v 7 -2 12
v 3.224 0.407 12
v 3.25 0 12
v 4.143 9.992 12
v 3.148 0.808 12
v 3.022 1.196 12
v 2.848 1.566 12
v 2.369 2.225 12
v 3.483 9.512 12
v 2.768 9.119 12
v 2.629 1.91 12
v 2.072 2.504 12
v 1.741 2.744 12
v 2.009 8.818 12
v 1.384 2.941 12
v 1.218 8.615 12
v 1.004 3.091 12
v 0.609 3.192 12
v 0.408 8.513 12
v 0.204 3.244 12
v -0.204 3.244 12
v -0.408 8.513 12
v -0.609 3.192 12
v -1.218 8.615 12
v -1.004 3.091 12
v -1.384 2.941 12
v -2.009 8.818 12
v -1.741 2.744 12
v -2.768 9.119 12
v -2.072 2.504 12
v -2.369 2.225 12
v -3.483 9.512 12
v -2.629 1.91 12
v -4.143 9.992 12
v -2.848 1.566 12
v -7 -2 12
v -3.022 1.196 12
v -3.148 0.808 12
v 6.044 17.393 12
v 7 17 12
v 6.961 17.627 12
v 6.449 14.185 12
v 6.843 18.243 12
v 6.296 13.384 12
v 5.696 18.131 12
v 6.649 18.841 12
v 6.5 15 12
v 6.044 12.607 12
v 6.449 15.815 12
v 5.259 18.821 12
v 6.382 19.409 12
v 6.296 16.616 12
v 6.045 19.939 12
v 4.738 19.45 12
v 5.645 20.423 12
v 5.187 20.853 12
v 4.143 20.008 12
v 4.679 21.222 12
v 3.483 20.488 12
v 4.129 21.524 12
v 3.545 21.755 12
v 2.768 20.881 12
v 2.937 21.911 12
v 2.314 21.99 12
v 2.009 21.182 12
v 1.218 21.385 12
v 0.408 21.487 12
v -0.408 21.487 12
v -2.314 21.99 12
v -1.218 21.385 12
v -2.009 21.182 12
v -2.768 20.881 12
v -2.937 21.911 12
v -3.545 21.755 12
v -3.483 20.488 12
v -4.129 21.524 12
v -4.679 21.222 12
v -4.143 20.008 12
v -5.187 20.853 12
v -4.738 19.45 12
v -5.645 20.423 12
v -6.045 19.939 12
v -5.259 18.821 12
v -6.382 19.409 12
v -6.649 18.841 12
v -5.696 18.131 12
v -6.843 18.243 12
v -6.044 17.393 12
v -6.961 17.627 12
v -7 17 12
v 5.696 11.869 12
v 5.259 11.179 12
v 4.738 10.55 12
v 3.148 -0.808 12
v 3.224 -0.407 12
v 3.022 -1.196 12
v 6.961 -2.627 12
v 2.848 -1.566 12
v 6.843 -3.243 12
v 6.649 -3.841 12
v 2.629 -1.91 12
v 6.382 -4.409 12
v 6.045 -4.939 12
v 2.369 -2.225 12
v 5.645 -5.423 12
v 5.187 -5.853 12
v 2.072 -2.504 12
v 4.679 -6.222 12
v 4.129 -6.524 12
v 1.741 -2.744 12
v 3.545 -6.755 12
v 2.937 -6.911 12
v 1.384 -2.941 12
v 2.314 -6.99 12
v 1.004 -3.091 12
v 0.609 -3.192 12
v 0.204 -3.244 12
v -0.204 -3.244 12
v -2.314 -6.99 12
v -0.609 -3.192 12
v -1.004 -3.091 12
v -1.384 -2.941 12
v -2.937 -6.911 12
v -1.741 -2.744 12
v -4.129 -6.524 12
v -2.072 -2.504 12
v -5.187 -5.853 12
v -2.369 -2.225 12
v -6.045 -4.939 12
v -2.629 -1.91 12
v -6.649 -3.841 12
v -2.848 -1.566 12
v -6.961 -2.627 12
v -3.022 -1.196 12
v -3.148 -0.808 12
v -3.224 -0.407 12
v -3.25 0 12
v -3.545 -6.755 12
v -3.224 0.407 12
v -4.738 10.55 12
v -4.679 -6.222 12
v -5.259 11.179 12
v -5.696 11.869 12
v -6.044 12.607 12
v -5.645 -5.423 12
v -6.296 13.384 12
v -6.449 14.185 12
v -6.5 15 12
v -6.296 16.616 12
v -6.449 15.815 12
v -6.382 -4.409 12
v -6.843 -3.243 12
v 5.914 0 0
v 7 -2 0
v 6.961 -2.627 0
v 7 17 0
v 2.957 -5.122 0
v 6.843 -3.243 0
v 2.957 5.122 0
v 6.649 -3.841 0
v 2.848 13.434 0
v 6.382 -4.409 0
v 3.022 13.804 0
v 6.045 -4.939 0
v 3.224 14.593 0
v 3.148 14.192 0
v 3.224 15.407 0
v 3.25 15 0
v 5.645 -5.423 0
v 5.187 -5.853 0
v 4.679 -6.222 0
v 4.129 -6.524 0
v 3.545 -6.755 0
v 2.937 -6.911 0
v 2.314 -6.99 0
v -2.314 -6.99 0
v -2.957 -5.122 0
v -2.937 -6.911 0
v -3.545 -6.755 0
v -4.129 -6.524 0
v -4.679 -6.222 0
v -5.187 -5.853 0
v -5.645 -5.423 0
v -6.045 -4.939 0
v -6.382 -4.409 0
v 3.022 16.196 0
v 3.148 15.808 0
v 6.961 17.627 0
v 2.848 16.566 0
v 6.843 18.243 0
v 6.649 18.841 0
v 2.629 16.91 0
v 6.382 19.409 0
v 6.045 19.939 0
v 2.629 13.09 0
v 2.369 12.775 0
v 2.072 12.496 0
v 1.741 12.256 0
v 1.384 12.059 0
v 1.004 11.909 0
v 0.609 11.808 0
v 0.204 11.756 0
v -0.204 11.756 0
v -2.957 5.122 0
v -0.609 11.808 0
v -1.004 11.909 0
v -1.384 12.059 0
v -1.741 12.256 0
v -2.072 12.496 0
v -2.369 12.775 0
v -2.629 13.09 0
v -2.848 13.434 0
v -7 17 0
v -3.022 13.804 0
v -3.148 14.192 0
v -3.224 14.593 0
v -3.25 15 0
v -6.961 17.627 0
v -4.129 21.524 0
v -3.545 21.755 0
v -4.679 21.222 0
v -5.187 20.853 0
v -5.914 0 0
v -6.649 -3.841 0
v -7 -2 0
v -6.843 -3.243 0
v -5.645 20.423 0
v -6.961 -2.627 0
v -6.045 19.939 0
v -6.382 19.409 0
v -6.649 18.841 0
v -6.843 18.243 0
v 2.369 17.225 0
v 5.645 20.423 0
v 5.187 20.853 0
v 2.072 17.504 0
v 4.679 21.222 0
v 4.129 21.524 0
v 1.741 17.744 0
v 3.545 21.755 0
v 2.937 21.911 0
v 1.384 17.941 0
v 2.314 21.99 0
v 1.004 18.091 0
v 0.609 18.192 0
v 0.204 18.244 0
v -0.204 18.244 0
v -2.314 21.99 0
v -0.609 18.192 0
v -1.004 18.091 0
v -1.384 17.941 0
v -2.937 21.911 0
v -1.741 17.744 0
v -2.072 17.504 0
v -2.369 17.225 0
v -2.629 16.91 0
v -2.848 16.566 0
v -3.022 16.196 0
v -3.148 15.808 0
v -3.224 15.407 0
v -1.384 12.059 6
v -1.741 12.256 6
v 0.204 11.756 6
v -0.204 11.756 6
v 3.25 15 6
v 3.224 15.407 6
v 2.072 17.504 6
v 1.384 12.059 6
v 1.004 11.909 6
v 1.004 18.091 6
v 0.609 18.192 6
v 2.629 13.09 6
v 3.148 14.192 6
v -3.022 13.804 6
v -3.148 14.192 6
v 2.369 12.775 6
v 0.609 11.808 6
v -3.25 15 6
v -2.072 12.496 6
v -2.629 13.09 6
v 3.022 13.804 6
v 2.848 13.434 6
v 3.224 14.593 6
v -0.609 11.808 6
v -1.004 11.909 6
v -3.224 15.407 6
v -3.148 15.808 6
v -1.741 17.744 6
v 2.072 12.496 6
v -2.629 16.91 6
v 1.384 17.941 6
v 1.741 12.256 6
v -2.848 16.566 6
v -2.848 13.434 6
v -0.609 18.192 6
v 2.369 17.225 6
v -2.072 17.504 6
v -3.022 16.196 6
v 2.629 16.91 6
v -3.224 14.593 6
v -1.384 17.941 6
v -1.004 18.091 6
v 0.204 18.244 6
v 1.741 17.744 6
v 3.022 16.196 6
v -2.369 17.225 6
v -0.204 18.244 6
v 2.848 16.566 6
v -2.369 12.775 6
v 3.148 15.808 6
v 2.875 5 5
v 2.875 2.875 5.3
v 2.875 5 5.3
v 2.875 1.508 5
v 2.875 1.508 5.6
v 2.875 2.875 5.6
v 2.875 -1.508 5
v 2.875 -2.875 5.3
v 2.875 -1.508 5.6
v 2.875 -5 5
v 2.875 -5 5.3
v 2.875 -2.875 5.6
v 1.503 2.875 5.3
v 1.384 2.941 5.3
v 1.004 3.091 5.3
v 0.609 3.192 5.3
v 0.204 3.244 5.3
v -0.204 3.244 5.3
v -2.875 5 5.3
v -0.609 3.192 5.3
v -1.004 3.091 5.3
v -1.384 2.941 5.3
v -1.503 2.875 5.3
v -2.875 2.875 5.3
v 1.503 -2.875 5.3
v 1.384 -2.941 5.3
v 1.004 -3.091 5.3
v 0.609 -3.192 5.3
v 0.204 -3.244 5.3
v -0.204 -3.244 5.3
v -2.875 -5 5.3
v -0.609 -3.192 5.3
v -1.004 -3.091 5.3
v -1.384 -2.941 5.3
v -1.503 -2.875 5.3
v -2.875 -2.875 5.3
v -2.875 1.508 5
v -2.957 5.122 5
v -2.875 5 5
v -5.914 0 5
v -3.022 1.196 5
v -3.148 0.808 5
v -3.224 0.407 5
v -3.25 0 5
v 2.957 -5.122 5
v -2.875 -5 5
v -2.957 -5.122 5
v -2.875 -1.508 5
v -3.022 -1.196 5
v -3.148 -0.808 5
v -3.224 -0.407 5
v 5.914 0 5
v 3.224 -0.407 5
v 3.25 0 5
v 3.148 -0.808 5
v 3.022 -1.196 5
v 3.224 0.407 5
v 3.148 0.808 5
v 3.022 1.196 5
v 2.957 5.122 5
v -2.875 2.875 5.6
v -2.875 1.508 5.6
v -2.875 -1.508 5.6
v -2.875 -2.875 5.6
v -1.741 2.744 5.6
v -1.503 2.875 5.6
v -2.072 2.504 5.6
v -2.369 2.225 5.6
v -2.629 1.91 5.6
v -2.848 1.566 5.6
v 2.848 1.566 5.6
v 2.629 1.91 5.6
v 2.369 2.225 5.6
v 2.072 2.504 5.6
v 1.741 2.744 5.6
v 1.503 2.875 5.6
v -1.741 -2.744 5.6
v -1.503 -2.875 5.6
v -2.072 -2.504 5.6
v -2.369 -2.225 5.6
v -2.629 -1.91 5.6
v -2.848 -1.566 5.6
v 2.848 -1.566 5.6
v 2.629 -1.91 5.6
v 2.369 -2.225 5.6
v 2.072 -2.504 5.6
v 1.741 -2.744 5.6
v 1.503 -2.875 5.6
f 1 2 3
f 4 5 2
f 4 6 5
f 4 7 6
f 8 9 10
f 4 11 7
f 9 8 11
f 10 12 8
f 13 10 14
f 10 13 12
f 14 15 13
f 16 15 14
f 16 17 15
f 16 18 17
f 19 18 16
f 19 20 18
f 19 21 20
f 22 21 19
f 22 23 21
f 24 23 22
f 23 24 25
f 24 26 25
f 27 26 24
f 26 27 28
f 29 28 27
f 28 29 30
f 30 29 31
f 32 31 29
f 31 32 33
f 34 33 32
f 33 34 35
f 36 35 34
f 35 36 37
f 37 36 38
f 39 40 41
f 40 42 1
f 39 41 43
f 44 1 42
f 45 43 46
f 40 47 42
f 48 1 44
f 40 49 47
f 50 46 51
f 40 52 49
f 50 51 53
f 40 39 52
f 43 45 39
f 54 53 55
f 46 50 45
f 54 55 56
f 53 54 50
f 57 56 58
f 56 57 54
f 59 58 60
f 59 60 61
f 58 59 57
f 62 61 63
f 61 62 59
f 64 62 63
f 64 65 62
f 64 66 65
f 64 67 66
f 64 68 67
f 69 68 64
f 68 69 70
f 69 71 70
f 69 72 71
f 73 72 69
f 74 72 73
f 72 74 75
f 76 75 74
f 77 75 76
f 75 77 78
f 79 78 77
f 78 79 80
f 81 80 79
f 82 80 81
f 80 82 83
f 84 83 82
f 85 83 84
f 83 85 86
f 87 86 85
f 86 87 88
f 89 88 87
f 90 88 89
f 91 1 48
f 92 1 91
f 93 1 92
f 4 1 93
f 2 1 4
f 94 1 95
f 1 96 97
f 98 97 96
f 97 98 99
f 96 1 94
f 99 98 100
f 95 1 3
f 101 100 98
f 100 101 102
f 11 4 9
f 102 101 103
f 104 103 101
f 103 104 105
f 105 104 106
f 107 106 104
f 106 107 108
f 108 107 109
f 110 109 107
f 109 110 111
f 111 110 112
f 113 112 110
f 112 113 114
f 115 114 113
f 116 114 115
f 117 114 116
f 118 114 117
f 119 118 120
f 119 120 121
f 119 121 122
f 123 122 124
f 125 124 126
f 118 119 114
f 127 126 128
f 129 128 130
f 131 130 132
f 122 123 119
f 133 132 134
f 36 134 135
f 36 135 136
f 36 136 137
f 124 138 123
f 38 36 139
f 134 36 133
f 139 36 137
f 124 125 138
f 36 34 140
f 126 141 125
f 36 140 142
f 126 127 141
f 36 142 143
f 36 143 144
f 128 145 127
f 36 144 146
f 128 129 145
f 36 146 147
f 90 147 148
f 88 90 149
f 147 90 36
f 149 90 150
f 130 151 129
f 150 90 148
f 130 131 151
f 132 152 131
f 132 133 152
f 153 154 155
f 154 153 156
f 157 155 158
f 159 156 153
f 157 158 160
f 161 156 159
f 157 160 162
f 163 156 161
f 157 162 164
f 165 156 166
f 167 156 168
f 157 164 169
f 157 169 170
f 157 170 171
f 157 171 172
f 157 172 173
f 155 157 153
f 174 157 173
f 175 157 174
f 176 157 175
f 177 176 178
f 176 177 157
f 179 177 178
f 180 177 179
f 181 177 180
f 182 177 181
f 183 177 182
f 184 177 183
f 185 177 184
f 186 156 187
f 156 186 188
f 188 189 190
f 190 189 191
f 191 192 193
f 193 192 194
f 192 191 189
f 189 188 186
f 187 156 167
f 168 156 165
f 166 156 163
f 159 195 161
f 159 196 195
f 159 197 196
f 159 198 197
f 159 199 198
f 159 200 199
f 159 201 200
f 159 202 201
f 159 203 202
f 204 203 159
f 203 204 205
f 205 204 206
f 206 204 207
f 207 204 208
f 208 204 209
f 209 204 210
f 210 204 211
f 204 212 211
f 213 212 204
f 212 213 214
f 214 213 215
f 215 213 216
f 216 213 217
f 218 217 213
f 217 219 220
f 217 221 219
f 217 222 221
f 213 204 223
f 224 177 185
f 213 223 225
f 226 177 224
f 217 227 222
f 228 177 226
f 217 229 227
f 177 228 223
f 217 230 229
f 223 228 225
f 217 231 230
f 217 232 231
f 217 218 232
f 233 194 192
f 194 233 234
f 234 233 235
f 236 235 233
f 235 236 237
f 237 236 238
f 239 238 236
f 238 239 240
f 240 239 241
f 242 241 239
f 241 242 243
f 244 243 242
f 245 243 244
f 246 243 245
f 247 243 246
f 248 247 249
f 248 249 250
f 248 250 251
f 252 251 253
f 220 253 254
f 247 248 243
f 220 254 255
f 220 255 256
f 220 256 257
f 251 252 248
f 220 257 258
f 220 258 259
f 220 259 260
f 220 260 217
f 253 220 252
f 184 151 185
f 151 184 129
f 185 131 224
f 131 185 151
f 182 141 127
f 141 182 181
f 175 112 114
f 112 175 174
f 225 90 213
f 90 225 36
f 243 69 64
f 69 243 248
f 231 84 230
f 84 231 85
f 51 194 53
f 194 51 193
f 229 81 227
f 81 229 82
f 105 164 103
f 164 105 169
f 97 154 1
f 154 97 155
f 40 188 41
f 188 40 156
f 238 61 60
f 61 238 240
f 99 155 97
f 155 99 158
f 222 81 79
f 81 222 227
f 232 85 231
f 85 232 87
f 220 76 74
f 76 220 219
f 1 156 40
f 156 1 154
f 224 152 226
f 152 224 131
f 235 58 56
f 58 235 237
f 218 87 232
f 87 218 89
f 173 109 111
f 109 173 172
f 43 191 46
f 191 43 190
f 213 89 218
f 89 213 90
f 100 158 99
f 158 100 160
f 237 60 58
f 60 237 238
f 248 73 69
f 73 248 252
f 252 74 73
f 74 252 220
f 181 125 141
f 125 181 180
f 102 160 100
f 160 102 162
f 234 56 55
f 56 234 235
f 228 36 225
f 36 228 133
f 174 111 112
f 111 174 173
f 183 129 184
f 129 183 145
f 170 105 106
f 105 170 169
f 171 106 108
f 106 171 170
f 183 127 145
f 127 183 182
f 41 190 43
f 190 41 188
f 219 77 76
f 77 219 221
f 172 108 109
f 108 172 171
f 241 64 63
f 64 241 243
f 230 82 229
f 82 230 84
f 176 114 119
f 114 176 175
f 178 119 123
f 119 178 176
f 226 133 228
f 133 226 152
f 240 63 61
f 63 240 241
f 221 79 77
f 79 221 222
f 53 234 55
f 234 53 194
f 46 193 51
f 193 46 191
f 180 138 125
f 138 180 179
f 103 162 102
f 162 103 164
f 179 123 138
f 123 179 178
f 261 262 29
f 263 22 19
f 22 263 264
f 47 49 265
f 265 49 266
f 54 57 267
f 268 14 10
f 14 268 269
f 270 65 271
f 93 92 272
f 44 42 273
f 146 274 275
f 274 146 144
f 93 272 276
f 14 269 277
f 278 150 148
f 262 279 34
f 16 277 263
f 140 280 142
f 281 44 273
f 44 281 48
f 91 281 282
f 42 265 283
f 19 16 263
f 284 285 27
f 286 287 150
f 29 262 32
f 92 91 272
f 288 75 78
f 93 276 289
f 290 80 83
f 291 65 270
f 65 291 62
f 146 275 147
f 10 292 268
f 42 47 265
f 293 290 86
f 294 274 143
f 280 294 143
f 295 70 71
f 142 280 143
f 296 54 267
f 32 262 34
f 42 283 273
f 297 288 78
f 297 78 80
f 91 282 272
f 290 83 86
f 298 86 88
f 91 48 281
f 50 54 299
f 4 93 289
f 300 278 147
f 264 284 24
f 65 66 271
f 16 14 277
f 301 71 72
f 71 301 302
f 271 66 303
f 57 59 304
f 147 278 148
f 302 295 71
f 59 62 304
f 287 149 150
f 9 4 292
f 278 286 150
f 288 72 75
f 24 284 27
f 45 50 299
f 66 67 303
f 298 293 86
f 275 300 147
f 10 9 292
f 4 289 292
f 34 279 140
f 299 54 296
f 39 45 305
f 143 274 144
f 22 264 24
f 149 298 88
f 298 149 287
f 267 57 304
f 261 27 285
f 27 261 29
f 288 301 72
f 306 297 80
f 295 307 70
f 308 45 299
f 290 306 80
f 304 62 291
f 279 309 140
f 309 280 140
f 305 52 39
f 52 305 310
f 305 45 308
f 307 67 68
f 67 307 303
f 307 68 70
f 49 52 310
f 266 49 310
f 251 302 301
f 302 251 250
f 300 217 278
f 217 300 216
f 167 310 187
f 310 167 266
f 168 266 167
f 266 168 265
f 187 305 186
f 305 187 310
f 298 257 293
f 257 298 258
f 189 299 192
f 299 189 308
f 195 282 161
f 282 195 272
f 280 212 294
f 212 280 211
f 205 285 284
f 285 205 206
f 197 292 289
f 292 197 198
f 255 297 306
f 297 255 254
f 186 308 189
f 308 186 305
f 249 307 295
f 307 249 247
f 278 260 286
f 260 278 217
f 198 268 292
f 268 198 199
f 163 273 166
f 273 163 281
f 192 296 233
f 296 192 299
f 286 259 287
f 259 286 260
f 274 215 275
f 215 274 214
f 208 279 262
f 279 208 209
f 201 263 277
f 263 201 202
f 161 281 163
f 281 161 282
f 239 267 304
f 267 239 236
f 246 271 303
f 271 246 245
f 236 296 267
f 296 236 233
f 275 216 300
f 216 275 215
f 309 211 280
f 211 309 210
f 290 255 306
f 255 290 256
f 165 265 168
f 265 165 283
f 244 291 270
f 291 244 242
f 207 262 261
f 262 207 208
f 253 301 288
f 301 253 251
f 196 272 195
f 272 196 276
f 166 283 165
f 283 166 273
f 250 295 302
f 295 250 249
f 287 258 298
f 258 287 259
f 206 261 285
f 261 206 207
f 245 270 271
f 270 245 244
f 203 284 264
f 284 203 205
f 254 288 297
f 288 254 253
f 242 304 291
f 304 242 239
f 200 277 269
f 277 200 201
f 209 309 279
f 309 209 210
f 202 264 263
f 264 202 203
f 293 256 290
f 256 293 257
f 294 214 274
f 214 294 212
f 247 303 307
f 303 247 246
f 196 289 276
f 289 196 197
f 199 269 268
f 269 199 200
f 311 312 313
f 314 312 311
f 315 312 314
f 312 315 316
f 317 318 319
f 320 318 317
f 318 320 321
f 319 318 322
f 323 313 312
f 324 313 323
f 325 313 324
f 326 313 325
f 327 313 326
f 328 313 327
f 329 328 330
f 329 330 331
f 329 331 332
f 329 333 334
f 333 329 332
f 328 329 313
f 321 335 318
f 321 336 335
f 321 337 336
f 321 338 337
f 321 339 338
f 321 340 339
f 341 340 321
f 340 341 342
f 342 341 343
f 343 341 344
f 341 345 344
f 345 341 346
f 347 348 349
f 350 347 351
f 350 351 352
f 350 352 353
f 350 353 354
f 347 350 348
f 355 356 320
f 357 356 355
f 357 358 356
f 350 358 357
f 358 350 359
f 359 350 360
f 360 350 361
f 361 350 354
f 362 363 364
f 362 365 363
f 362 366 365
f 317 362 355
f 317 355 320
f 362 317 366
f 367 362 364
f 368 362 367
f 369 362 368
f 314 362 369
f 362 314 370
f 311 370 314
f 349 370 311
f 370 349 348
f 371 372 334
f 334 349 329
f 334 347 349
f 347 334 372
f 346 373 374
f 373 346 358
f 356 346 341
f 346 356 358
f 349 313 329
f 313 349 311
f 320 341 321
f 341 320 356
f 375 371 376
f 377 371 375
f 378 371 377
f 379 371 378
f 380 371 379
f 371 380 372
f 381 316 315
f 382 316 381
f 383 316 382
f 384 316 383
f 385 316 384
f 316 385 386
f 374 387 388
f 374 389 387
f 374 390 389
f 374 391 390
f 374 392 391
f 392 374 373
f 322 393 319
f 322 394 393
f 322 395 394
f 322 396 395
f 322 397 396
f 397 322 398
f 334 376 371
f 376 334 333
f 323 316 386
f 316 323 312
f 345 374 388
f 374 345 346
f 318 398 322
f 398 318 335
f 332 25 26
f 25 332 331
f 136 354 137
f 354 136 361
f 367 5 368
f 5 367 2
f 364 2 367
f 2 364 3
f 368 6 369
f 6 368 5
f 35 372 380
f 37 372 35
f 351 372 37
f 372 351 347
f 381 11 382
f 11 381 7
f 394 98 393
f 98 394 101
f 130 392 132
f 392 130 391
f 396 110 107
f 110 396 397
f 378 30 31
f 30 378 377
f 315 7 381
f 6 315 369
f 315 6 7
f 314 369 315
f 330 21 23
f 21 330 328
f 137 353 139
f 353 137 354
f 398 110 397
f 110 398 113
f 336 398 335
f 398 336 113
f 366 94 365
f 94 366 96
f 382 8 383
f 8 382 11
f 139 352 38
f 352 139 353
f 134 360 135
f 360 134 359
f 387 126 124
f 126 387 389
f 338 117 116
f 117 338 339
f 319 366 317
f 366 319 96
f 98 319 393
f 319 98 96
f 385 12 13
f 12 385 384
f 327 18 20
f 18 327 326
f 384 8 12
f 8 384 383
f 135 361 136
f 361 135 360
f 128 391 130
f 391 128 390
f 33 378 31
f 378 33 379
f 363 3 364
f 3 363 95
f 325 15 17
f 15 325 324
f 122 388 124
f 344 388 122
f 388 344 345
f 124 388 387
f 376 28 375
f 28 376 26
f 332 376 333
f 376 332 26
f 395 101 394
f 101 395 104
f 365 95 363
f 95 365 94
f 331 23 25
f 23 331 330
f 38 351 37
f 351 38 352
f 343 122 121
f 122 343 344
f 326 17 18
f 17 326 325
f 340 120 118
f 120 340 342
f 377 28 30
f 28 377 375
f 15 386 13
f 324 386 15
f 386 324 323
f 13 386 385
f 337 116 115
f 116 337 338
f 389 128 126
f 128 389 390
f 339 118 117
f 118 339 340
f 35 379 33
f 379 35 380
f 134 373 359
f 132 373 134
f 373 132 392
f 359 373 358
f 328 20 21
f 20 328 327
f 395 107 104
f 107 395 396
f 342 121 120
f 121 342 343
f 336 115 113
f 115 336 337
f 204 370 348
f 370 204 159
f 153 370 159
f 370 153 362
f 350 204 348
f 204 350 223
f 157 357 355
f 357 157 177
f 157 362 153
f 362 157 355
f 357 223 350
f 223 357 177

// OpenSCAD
$fn = 50;


difference() {
	union() {
		cylinder(h = 12, r = 7.0000000000);
		translate(v = [0.0000000000, 7.5000000000, 0]) {
			hull() {
				translate(v = [-2.0000000000, 9.5000000000, 0]) {
					cylinder(h = 12, r = 5);
				}
				translate(v = [2.0000000000, 9.5000000000, 0]) {
					cylinder(h = 12, r = 5);
				}
				translate(v = [-2.0000000000, -9.5000000000, 0]) {
					cylinder(h = 12, r = 5);
				}
				translate(v = [2.0000000000, -9.5000000000, 0]) {
					cylinder(h = 12, r = 5);
				}
			}
		}
		translate(v = [0.0000000000, 7.5000000000, 0]) {
			hull() {
				translate(v = [-2.0000000000, 9.5000000000, 0]) {
					cylinder(h = 12, r = 5);
				}
				translate(v = [2.0000000000, 9.5000000000, 0]) {
					cylinder(h = 12, r = 5);
				}
				translate(v = [-2.0000000000, -9.5000000000, 0]) {
					cylinder(h = 12, r = 5);
				}
				translate(v = [2.0000000000, -9.5000000000, 0]) {
					cylinder(h = 12, r = 5);
				}
			}
		}
	}
	union() {
		translate(v = [0.0000000000, 15.0000000000, 12]) {
			rotate(a = [0, 0, 0]) {
				difference() {
					union() {
						#translate(v = [0, 0, -12.0000000000]) {
							cylinder(h = 12, r = 2.2500000000);
						}
						#translate(v = [0, 0, -6]) {
							cylinder(h = 6, r1 = 3.2500000000, r2 = 6.5000000000);
						}
						#translate(v = [0, 0, -12.0000000000]) {
							cylinder(h = 12, r = 3.2500000000);
						}
						#translate(v = [0, 0, -12.0000000000]) {
							cylinder(h = 12, r = 2.2500000000);
						}
					}
					union();
				}
			}
		}
		translate(v = [0.0000000000, 15.0000000000, 12]) {
			rotate(a = [0, 0, 0]) {
				difference() {
					union() {
						#translate(v = [0, 0, -12.0000000000]) {
							cylinder(h = 12, r = 2.2500000000);
						}
						#translate(v = [0, 0, -6]) {
							cylinder(h = 6, r1 = 3.2500000000, r2 = 6.5000000000);
						}
						#translate(v = [0, 0, -12.0000000000]) {
							cylinder(h = 12, r = 3.2500000000);
						}
						#translate(v = [0, 0, -12.0000000000]) {
							cylinder(h = 12, r = 2.2500000000);
						}
					}
					union();
				}
			}
		}
		translate(v = [0.0000000000, 0.0000000000, 0]) {
			rotate(a = [0, 0, 0]) {
				difference() {
					union() {
						#translate(v = [-2.8750000000, -5.0000000000, -0.3000000000]) {
							cube(size = [5.7500000000, 10, 0.3000000000]);
						}
						#translate(v = [-2.8750000000, -2.8750000000, -0.6000000000]) {
							cube(size = [5.7500000000, 5.7500000000, 0.3000000000]);
						}
						#translate(v = [-2.8750000000, -5.0000000000, 5]) {
							cube(size = [5.7500000000, 10, 0.3000000000]);
						}
						#translate(v = [-2.8750000000, -2.8750000000, 5.3000000000]) {
							cube(size = [5.7500000000, 5.7500000000, 0.3000000000]);
						}
						#translate(v = [0, 0, -100.0000000000]) {
							cylinder(h = 200, r = 3.2500000000);
						}
						#linear_extrude(height = 5) {
							polygon(points = [[5.9142500000, 0.0000000000], [2.9571250000, 5.1218907443], [-2.9571250000, 5.1218907443], [-5.9142500000, 0.0000000000], [-2.9571250000, -5.1218907443], [2.9571250000, -5.1218907443]]);
						}
						#translate(v = [-2.8750000000, -5.0000000000, -0.3000000000]) {
							cube(size = [5.7500000000, 10, 0.3000000000]);
						}
						#translate(v = [-2.8750000000, -2.8750000000, -0.6000000000]) {
							cube(size = [5.7500000000, 5.7500000000, 0.3000000000]);
						}
						#translate(v = [-2.8750000000, -5.0000000000, 5]) {
							cube(size = [5.7500000000, 10, 0.3000000000]);
						}
						#translate(v = [-2.8750000000, -2.8750000000, 5.3000000000]) {
							cube(size = [5.7500000000, 5.7500000000, 0.3000000000]);
						}
						#translate(v = [0, 0, -100.0000000000]) {
							cylinder(h = 200, r = 3.2500000000);
						}
						#translate(v = [-2.8750000000, -5.0000000000, -0.3000000000]) {
							cube(size = [5.7500000000, 10, 0.3000000000]);
						}
						#translate(v = [-2.8750000000, -2.8750000000, -0.6000000000]) {
							cube(size = [5.7500000000, 5.7500000000, 0.3000000000]);
						}
						#translate(v = [-2.8750000000, -5.0000000000, 5]) {
							cube(size = [5.7500000000, 10, 0.3000000000]);
						}
						#translate(v = [-2.8750000000, -2.8750000000, 5.3000000000]) {
							cube(size = [5.7500000000, 5.7500000000, 0.3000000000]);
						}
						#translate(v = [0, 0, -100.0000000000]) {
							cylinder(h = 200, r = 3.2500000000);
						}
					}
					union();
				}
			}
		}
		translate(v = [0, 0, -100]) {
			cylinder(h = 200, r = 3.2500000000);
		}
		translate(v = [0, 0, -100]) {
			cylinder(h = 200, r = 1.8000000000);
		}
	}
}
